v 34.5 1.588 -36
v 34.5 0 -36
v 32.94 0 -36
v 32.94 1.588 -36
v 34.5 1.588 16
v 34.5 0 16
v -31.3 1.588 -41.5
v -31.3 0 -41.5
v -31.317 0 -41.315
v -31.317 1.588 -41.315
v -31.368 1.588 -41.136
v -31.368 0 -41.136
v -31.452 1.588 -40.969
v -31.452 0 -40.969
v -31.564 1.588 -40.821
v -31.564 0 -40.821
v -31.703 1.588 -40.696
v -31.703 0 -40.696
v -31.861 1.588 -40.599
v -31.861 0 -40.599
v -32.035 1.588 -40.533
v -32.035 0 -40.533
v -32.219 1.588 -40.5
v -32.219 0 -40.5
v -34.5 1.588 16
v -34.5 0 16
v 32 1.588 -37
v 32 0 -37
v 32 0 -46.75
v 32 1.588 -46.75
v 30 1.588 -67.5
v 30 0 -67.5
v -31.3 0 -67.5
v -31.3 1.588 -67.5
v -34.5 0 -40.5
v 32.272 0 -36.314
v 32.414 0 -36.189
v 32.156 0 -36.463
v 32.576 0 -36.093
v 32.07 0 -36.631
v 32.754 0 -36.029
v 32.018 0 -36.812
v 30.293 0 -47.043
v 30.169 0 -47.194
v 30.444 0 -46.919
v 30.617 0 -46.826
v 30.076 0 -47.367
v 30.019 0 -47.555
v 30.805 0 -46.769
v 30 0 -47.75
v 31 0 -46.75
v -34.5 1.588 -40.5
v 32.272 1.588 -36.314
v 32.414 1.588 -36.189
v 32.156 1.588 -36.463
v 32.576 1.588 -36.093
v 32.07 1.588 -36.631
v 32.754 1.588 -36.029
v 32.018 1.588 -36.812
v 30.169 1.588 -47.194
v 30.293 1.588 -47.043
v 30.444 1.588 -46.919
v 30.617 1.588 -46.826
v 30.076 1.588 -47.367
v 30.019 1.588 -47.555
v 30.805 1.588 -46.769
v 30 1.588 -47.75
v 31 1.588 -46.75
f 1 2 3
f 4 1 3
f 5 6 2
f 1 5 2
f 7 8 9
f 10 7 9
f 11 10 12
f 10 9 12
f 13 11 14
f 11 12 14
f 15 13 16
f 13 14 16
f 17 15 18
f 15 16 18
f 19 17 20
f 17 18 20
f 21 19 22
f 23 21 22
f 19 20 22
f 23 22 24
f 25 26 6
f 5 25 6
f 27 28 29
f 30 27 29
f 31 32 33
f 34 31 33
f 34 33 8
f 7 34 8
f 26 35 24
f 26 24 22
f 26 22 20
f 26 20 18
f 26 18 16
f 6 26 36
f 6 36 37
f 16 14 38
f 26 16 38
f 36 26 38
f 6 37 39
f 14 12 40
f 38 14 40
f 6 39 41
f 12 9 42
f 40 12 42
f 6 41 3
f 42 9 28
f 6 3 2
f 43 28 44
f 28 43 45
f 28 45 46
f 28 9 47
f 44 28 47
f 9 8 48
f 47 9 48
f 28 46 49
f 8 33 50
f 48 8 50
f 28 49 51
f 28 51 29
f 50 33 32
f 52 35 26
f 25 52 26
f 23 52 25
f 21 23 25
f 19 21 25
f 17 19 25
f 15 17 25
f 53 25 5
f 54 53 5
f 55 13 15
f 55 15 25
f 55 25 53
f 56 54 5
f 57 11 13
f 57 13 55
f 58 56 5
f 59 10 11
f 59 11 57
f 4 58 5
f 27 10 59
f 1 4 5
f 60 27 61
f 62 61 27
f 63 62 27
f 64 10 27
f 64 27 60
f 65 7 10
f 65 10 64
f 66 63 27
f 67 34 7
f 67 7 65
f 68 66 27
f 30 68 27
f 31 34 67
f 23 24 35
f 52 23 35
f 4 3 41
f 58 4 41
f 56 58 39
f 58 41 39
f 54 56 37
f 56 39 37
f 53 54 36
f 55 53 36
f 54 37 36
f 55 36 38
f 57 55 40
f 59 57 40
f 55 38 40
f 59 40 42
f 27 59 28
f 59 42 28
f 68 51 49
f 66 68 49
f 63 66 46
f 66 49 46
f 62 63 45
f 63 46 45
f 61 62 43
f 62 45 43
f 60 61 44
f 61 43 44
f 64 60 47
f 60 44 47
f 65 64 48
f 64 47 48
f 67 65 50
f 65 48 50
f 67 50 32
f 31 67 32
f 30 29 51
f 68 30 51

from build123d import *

# Parameters (mm, degrees)
FR4_DEPTH = 1.5875


with BuildPart() as part:
    # Sketch1 → FR4 (new body)
    with BuildSketch(Plane(origin=(0, 0, 0), x_dir=(1, 0, 0), z_dir=(0, 1, 0))):
        with BuildLine():
            Line((34.5, -9), (34.5, 36))
            Line((34.5, 36), (32.940007652, 36))
            ThreePointArc((32.940007652, 36), (32.271894631, 36.313775841), (32, 37))
            Line((32, 37), (32, 46.75))
            Line((32, 46.75), (31, 46.75))
            ThreePointArc((31, 46.75), (30.292893219, 47.042893219), (30, 47.75))
            Line((30, 47.75), (30, 67.5))
            Line((30, 67.5), (-31.3, 67.5))
            Line((-31.3, 67.5), (-31.3, 41.5))
            ThreePointArc((-31.3, 41.5), (-31.564481186, 40.821086647), (-32.218527823, 40.5))
            Line((-32.218527823, 40.5), (-34.5, 40.5))
            Line((-34.5, 40.5), (-34.5, -9))
            Line((-34.5, -9), (-34.5, -16))
            Line((-34.5, -16), (34.5, -16))
            Line((34.5, -16), (34.5, -9))
        make_face()
    extrude(amount=FR4_DEPTH)


solid = part.part
